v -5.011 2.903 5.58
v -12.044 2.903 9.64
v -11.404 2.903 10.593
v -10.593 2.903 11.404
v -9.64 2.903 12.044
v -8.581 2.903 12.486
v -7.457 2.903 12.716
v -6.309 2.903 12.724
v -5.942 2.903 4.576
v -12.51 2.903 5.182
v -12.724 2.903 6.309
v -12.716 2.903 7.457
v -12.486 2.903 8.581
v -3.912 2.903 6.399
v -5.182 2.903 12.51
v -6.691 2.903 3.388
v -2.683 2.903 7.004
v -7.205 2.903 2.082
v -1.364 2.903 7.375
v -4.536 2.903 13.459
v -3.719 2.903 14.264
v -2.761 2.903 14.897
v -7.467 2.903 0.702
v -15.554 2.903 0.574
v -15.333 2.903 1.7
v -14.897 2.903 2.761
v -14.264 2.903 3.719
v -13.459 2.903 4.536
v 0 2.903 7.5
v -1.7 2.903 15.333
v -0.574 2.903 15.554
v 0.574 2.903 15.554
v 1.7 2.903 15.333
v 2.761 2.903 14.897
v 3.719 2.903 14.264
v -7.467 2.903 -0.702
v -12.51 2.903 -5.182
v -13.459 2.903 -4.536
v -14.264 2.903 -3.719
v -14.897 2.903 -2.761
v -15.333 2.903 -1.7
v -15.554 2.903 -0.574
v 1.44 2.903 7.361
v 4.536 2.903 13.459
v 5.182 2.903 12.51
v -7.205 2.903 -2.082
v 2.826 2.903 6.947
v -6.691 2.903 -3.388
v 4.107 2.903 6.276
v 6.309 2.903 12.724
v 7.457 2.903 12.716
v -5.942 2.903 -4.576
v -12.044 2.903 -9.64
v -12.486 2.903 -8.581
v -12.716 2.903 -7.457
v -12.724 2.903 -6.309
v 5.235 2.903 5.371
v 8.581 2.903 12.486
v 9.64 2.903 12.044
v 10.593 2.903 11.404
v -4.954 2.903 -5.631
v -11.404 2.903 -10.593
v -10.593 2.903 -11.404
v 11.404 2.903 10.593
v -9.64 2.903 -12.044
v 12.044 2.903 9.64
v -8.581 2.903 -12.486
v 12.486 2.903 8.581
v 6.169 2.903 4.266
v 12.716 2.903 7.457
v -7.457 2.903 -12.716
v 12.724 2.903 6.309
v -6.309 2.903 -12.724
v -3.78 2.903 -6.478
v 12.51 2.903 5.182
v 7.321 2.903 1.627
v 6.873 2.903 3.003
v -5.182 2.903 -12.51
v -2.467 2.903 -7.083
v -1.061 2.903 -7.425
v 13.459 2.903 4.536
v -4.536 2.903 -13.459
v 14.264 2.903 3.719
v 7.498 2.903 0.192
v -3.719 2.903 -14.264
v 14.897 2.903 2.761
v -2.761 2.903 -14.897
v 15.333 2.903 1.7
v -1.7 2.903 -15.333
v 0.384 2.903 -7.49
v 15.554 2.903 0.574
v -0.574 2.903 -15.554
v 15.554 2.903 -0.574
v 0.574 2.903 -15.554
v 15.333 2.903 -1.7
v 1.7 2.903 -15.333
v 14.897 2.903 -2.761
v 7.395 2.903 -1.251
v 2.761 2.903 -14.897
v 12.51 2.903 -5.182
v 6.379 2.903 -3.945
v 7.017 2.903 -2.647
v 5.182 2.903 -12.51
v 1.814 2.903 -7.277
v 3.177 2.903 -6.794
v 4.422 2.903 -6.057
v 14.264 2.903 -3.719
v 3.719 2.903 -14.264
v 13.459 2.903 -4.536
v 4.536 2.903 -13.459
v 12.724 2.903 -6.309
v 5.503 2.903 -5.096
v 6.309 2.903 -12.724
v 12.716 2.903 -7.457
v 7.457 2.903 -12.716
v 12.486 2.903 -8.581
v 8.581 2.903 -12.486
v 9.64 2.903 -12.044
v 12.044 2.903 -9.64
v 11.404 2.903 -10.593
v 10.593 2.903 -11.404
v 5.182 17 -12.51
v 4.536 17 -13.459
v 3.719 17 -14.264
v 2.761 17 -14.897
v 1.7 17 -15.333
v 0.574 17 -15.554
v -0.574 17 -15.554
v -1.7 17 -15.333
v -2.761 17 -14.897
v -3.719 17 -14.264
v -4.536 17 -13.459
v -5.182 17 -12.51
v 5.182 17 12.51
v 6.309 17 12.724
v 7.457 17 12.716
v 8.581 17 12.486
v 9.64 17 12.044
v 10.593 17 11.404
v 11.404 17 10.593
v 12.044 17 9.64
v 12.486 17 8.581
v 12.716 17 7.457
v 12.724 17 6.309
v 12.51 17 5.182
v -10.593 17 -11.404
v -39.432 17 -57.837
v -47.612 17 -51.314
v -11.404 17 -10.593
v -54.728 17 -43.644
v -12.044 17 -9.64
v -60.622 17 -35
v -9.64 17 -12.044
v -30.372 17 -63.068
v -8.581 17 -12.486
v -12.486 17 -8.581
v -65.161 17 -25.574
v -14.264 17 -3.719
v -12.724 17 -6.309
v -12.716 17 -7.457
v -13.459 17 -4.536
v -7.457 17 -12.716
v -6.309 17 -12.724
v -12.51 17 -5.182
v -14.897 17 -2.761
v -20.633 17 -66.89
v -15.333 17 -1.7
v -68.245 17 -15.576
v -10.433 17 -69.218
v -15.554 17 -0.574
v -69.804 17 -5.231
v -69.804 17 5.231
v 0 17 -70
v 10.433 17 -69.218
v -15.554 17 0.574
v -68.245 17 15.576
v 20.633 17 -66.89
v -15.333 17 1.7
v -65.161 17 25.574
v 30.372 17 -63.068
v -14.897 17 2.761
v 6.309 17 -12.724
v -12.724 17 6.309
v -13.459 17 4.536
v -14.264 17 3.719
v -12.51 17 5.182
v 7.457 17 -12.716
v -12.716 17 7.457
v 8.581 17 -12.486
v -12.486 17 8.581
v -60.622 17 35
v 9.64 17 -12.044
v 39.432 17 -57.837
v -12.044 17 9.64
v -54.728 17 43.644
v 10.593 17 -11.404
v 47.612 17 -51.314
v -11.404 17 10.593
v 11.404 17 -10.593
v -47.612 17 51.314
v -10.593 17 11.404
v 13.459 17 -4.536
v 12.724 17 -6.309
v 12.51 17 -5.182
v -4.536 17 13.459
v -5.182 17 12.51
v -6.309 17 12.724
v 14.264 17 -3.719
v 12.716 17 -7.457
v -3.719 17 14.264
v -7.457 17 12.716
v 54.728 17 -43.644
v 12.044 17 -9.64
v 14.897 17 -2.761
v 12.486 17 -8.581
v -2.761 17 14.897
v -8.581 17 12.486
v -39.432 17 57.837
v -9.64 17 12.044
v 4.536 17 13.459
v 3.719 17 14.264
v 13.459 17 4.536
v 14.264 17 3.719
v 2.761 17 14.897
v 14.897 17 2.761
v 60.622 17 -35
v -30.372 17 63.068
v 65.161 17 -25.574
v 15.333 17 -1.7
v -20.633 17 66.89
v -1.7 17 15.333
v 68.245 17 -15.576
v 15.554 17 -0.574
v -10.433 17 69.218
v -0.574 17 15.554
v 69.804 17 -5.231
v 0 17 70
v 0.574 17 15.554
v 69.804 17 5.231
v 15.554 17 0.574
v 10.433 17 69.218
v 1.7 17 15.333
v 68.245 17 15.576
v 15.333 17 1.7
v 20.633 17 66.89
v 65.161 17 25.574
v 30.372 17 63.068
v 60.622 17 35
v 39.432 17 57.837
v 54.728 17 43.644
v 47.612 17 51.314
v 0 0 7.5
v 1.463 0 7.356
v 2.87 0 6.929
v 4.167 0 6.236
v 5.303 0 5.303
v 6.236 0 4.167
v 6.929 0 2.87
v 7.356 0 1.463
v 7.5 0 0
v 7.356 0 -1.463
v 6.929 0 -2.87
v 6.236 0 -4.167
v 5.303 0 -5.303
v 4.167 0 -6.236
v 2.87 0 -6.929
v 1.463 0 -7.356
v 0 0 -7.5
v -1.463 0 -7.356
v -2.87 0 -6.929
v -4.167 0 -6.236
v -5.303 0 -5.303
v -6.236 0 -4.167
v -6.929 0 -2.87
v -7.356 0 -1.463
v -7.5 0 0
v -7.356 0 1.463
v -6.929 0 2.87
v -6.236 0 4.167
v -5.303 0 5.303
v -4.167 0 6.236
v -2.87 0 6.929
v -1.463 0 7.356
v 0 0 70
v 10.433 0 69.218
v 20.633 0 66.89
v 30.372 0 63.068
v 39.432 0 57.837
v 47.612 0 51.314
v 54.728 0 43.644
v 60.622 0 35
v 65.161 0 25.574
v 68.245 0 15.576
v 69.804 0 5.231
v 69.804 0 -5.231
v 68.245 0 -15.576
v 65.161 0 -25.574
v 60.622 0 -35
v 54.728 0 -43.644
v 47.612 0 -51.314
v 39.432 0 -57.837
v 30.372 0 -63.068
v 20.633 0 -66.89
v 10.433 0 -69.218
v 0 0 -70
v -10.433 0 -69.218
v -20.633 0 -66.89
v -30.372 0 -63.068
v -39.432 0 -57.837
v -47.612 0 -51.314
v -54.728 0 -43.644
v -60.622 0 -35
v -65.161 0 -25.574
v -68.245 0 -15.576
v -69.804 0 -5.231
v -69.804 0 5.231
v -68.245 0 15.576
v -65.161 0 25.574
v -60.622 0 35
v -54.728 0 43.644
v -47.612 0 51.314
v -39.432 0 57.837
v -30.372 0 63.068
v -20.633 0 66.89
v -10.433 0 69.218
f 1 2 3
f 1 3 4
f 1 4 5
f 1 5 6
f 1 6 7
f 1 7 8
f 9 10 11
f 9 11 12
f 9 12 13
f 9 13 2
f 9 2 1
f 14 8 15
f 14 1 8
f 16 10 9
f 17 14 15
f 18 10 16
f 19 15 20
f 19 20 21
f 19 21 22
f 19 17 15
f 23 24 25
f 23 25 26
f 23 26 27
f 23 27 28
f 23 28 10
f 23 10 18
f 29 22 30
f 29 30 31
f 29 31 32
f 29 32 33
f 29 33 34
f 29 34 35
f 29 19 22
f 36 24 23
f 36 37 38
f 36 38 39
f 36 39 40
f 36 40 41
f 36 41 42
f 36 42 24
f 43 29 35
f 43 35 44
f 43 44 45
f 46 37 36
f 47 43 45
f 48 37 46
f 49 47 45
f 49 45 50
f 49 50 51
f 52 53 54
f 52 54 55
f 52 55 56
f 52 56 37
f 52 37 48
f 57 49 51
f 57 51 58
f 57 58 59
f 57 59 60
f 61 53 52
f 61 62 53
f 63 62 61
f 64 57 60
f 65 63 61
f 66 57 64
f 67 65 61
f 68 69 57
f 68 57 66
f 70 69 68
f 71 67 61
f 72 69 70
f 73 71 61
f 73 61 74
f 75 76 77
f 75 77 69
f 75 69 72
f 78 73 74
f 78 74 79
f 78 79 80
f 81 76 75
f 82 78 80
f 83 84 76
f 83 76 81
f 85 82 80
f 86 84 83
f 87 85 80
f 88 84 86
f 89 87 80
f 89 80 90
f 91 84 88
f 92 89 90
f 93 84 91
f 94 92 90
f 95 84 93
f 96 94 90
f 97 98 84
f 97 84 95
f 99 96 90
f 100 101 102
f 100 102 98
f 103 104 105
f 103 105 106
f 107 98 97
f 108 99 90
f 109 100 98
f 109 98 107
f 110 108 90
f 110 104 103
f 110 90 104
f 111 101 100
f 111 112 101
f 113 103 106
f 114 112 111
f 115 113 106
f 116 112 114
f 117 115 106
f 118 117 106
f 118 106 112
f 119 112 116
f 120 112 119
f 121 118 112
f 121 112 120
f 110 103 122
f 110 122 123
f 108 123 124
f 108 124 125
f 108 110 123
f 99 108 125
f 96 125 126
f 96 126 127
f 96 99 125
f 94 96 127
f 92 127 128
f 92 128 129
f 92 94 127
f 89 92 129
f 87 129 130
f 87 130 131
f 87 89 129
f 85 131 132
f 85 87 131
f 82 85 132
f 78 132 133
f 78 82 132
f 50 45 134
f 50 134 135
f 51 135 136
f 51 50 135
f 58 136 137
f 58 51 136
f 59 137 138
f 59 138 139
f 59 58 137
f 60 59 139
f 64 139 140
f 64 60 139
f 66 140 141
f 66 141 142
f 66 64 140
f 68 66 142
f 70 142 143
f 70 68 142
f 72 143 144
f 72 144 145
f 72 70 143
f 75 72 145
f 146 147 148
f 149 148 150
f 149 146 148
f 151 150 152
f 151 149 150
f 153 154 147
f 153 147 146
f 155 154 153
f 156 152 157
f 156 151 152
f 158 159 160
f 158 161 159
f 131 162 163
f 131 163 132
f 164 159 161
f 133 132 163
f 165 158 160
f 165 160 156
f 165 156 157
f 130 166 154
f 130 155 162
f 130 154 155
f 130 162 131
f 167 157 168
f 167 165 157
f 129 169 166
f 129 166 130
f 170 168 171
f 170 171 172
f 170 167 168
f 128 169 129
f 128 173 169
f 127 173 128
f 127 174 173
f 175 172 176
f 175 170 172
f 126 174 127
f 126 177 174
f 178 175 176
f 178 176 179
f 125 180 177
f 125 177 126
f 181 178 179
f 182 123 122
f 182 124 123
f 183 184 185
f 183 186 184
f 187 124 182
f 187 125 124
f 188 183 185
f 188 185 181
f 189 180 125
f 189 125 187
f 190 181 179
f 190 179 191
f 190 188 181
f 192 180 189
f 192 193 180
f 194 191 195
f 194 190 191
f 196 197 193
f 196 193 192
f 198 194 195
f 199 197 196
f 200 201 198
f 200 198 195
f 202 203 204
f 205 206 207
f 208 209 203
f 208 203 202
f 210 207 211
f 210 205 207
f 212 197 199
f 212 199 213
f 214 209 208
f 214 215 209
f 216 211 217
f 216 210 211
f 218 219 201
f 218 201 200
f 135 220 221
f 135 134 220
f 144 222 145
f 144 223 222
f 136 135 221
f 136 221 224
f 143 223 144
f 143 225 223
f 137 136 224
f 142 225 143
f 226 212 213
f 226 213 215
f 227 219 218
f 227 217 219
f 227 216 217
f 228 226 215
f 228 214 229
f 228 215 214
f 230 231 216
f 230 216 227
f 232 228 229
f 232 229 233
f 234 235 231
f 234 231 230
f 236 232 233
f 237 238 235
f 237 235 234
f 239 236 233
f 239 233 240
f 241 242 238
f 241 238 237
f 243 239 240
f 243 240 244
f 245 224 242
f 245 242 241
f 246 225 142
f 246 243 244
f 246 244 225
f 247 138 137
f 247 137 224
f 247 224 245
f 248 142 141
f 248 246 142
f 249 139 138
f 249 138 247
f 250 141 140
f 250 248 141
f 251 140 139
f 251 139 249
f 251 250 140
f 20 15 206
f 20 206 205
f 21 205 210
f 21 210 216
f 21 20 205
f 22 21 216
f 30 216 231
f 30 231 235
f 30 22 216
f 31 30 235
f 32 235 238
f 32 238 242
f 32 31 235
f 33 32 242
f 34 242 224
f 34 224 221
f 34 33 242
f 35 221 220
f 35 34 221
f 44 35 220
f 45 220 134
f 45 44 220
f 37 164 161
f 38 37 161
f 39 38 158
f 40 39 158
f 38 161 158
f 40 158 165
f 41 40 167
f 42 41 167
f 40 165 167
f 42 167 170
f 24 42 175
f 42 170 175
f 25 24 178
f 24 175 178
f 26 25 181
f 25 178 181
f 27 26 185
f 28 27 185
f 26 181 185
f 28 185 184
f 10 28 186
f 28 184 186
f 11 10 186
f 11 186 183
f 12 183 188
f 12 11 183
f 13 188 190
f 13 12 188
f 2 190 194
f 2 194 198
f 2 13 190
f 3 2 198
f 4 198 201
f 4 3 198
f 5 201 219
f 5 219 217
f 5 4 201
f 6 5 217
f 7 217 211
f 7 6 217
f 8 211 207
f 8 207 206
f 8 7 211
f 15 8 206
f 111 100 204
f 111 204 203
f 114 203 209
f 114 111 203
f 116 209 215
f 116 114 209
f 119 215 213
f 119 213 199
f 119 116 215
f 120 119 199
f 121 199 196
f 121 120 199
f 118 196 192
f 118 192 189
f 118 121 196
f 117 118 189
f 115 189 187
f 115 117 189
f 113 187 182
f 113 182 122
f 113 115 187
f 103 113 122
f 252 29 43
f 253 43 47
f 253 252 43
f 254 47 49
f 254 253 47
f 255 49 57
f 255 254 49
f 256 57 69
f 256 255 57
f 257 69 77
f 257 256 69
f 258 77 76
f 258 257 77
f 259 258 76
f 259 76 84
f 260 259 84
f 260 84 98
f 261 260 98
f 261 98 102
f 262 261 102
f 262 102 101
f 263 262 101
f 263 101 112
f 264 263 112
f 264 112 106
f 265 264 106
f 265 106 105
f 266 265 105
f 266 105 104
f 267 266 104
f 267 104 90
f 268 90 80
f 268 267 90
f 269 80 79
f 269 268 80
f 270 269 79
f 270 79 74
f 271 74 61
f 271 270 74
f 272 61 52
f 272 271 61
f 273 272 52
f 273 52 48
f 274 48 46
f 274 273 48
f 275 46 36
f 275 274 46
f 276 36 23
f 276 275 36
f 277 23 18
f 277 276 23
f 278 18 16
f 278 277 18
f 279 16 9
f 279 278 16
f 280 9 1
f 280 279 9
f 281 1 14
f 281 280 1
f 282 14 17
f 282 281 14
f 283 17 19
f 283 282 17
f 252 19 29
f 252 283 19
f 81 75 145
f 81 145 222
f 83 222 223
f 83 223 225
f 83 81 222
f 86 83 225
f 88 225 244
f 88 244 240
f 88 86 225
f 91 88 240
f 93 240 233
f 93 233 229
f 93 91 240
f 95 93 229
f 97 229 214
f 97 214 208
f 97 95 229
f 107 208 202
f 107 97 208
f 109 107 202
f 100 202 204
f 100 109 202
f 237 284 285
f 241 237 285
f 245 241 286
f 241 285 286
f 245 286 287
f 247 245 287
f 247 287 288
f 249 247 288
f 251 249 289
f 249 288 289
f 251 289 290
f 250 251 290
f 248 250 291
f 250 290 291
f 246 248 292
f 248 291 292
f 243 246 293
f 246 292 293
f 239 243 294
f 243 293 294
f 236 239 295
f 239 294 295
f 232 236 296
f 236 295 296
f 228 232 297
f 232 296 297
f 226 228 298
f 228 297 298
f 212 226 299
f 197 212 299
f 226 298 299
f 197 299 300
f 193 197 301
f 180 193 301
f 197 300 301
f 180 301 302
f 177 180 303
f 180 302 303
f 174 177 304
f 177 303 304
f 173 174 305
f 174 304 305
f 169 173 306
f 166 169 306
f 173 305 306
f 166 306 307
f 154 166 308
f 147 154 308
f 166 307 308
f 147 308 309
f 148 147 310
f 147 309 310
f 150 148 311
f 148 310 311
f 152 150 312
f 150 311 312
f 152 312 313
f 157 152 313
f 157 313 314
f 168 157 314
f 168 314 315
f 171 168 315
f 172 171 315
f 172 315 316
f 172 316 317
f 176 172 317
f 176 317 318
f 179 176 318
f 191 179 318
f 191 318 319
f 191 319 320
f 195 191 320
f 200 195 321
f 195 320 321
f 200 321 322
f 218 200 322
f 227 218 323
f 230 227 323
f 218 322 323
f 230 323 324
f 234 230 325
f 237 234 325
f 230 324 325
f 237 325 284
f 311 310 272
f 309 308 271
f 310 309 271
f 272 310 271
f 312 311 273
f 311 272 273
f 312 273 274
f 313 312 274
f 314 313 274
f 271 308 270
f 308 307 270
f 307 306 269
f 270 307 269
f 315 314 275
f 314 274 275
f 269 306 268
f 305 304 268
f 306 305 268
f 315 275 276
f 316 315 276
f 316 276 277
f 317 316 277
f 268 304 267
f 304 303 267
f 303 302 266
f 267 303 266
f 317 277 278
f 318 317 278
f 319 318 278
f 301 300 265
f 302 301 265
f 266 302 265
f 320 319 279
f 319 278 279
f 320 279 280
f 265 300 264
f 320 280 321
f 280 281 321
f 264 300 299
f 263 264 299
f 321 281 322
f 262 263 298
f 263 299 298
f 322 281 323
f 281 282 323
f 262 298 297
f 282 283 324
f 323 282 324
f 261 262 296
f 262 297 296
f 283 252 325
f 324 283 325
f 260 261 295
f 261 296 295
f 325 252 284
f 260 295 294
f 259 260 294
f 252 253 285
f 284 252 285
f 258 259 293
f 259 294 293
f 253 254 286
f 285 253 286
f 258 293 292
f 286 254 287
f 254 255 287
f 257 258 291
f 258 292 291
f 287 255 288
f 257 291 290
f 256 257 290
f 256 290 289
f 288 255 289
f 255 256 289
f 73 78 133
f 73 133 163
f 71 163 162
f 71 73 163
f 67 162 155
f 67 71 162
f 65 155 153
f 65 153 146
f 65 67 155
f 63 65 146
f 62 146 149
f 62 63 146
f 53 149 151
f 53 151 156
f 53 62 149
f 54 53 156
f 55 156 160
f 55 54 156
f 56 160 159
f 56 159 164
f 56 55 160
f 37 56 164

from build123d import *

# Parameters (mm, degrees)
SKETCH1_R           = 70
BOSS_EXTRUDE1_DEPTH = 17
SKETCH2_R           = 7.5
CUT_EXTRUDE1_DEPTH  = 101.444014257
SKETCH3_R           = 5.906037177
CUT_EXTRUDE2_DEPTH  = 14.097280092
CIRPATTERN1_COUNT   = 8


with BuildPart() as part:
    # Sketch1 → Boss-Extrude1 (new body)
    with BuildSketch(Plane(origin=(0, 0, 0), x_dir=(1, 0, 0), z_dir=(0, 1, 0))):
        Circle(SKETCH1_R)
    extrude(amount=BOSS_EXTRUDE1_DEPTH)

    # Sketch2 → Cut-Extrude1 (cut, through all)
    with BuildSketch(Plane(origin=(0, 0, 0), x_dir=(1, 0, 0), z_dir=(0, 1, 0))):
        Circle(SKETCH2_R)
    extrude(amount=CUT_EXTRUDE1_DEPTH, mode=Mode.SUBTRACT)

    # Sketch3 → Cut-Extrude2 (cut)
    with BuildSketch(Plane(origin=(0, 17, 0), x_dir=(1, 0, 0), z_dir=(0, 1, 0))):
        with Locations((-9.676366693, 0)):
            Circle(SKETCH3_R)
    cut_extrude2 = extrude(amount=-CUT_EXTRUDE2_DEPTH, mode=Mode.SUBTRACT)

    # CirPattern1: Cut-Extrude2 ×8 about axis
    cirpattern1_axis = Axis((0, 0, 0), (0, 1, 0))
    for i in range(1, CIRPATTERN1_COUNT):
        add(cut_extrude2.rotate(cirpattern1_axis, i * 360 / CIRPATTERN1_COUNT), mode=Mode.SUBTRACT)


solid = part.part
